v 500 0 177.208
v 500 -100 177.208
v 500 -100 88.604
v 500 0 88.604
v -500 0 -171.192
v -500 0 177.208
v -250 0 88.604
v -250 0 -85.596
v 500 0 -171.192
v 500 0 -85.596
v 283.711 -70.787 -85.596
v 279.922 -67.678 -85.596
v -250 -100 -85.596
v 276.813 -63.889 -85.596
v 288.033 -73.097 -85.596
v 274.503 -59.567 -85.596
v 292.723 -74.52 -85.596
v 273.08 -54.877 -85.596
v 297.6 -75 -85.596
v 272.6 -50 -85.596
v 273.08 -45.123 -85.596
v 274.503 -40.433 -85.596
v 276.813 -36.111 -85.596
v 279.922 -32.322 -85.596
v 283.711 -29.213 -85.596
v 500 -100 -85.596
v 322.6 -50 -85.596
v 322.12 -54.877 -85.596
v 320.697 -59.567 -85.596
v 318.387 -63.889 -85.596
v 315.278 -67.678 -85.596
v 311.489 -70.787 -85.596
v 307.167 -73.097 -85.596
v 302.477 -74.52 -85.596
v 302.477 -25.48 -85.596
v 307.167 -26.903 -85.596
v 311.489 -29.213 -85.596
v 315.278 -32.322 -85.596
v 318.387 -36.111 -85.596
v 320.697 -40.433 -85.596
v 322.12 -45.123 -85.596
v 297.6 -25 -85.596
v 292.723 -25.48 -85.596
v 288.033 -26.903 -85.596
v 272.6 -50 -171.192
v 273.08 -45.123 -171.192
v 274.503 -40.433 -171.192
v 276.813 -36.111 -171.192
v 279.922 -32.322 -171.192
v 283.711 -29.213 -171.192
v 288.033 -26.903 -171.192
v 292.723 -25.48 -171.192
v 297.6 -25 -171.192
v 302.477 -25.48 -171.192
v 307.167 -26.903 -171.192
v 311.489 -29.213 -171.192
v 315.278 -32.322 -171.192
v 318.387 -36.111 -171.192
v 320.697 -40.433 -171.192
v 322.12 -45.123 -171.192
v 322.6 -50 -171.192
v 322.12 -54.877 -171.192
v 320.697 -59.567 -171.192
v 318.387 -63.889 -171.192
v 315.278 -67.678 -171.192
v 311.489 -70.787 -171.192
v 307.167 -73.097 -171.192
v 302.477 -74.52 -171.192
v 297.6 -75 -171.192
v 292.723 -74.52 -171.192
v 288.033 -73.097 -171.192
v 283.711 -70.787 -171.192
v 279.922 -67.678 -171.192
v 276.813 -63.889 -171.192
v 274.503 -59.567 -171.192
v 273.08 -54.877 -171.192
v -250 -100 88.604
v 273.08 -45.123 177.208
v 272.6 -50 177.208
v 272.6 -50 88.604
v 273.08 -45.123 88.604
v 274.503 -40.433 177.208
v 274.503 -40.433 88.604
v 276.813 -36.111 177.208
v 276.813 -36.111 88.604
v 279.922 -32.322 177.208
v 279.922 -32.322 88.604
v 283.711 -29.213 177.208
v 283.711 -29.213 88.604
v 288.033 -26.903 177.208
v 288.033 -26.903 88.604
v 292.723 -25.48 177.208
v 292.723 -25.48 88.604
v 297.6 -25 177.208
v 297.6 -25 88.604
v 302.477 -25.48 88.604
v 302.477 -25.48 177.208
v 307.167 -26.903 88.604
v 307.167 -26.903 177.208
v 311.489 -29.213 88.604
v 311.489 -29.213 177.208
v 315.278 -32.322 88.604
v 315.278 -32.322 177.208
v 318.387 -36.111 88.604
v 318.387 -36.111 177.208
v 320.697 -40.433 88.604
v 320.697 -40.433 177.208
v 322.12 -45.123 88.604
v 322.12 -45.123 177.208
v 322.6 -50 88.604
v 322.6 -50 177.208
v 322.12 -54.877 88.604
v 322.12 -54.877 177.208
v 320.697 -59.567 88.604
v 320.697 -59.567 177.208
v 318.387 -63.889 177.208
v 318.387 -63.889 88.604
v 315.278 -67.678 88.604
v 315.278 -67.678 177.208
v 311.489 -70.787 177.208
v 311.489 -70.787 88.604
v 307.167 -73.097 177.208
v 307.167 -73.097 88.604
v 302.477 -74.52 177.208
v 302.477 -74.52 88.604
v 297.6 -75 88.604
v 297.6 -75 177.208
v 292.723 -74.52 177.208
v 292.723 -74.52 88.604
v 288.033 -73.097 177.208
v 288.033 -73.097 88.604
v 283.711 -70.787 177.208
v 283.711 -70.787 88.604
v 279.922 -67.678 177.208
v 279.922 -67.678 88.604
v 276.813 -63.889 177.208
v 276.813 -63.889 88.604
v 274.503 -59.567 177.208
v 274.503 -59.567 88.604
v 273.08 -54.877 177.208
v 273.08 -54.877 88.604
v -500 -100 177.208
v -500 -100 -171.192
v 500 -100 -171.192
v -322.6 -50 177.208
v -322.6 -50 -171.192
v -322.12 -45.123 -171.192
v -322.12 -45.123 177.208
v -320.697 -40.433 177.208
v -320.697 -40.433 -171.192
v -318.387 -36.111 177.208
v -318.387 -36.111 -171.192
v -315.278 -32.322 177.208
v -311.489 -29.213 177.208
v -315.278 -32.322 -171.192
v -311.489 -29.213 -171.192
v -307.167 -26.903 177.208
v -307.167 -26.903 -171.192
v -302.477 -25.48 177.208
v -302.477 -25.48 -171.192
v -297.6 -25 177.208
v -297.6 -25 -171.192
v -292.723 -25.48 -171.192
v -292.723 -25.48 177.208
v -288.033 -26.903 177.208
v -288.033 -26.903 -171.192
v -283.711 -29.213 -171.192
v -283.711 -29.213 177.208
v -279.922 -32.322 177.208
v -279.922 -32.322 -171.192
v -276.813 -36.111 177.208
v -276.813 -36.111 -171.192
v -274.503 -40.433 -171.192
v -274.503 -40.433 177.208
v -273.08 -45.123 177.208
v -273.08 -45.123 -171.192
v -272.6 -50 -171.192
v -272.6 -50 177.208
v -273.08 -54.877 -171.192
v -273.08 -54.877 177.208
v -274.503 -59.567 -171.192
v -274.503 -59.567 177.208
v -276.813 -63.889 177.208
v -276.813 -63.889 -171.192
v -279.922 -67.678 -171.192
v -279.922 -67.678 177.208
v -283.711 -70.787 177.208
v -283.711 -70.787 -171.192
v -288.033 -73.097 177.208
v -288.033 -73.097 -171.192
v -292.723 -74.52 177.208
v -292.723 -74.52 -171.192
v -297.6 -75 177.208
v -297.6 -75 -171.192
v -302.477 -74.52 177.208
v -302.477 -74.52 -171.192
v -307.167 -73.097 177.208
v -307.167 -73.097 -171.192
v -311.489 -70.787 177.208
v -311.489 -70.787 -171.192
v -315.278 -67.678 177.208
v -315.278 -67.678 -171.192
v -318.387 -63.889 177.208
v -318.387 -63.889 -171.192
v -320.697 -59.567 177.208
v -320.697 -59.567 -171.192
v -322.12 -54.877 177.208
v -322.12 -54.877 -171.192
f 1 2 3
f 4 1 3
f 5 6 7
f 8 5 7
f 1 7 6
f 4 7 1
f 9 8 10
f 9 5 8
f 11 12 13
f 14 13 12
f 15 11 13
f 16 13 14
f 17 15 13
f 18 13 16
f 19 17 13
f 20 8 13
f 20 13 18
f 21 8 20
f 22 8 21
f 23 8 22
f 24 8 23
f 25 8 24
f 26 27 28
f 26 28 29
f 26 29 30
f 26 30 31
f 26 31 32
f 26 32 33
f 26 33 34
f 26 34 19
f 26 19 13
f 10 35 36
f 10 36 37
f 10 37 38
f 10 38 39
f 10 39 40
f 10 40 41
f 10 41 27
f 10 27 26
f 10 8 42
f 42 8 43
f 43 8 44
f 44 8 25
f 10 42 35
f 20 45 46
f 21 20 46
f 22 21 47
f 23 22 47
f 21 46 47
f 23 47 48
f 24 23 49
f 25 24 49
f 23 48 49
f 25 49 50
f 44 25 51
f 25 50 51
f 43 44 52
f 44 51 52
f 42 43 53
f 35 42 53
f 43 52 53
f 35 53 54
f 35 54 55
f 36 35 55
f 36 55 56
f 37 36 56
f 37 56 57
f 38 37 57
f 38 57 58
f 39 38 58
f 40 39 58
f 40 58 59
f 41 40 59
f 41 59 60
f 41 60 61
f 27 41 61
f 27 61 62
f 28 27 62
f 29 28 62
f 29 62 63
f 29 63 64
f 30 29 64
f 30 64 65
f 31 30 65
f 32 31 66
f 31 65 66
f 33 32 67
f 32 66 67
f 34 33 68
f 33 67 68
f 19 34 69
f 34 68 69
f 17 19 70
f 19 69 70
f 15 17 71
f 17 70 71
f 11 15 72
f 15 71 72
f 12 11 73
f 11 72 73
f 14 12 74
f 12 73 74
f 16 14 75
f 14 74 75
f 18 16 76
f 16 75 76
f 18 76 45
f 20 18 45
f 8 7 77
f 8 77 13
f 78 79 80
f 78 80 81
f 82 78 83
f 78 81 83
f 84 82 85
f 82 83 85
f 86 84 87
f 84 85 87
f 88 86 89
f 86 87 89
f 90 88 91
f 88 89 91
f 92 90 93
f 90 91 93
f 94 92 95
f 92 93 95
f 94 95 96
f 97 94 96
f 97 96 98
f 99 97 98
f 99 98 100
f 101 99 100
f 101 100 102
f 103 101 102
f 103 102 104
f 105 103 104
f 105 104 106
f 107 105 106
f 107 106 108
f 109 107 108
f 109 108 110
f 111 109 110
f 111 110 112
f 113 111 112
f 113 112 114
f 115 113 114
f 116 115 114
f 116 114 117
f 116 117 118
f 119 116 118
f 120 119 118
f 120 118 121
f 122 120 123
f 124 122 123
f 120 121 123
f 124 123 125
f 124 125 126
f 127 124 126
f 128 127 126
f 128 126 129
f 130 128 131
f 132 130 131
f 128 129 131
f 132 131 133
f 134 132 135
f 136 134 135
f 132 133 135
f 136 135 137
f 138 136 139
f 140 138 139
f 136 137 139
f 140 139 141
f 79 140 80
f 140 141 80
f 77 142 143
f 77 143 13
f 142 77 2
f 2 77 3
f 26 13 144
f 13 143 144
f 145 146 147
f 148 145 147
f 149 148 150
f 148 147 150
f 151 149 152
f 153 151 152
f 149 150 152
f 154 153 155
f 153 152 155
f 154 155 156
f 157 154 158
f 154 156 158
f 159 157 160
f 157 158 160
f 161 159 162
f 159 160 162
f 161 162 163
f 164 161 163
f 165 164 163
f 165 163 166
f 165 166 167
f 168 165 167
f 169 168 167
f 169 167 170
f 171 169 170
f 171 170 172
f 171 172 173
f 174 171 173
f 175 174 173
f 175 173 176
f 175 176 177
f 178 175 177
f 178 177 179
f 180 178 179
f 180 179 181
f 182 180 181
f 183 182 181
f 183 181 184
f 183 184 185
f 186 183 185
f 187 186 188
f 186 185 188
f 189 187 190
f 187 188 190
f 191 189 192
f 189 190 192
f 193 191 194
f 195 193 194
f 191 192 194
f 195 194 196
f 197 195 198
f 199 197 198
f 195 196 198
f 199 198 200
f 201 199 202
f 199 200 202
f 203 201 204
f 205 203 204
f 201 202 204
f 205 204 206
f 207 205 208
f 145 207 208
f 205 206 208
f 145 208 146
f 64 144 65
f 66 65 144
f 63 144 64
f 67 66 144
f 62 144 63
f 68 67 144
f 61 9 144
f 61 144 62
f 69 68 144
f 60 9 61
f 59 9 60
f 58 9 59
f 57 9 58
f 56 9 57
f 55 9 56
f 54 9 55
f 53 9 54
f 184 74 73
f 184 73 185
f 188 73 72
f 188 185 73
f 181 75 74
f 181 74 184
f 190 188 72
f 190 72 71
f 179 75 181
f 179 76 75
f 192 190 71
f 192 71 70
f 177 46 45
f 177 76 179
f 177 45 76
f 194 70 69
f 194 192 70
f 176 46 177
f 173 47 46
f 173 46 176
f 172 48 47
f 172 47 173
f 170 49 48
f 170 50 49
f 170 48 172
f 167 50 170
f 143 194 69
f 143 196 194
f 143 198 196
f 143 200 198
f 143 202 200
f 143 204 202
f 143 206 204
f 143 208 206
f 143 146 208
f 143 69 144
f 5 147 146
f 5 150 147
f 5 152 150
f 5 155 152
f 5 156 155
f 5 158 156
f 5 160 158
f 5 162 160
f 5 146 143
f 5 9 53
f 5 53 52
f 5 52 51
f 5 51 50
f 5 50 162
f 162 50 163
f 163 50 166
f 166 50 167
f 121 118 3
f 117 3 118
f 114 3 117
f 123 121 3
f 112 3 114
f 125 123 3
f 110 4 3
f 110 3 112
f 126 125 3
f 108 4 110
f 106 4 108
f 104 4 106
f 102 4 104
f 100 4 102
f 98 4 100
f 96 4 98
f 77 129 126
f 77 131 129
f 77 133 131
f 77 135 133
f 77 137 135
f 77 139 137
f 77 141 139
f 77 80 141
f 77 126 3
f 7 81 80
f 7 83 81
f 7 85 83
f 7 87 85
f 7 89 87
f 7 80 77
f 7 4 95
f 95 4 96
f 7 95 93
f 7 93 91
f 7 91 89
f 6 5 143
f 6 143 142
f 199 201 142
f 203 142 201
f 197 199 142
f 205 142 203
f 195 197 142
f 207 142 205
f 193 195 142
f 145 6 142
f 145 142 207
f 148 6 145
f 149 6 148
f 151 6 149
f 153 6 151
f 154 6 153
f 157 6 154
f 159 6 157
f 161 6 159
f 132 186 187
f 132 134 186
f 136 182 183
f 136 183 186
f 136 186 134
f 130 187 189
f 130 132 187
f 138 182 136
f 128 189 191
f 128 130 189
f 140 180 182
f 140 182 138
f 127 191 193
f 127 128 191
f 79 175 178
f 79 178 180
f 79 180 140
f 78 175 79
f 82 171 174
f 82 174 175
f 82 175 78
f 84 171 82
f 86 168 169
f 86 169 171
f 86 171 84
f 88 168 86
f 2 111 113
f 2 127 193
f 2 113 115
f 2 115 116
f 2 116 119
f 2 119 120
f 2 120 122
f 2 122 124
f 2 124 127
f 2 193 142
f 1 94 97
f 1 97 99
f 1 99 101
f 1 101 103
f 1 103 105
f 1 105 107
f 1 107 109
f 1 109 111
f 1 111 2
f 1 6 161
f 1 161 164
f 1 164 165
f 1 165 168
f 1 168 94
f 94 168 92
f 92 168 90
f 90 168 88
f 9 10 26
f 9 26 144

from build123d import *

# Parameters (mm, degrees)
BOSS_EXTRUDE1_DEPTH = 100
CUT_EXTRUDE1_REACH  = 619.562
SKETCH8_R           = 25


with BuildPart() as part:
    # Sketch5 → Boss-Extrude1 (new body)
    with BuildSketch(Plane(origin=(0, 0, 0), x_dir=(-1, 0, 0), z_dir=(0, -1, 0))):
        Polygon((-500, 171.192494481), (500, 171.192494481), (500, -177.207505519), (-500, -177.207505519), (-500, -88.603752759), (250, -88.603752759), (250, 85.596247241), (-500, 85.596247241), align=None)
    extrude(amount=BOSS_EXTRUDE1_DEPTH)

    # Cut-Extrude1: up to this face of the body (flat: up to its plane)
    cut_extrude1_end = Plane(part.part.faces().sort_by_distance((0, -50, 177.207505519))[0])
    # Sketch8 → Cut-Extrude1 (cut, up to the picked face)
    with BuildSketch(Plane(origin=(0, 0, -171.192494481), x_dir=(-1, 0, 0), z_dir=(0, 0, -1)), mode=Mode.PRIVATE) as cut_extrude1_sk1:
        with Locations((-297.6, -50)):
            Circle(SKETCH8_R)
    cut_extrude1_tool1 = split(extrude(cut_extrude1_sk1.sketch, amount=-CUT_EXTRUDE1_REACH, mode=Mode.PRIVATE), bisect_by=cut_extrude1_end, keep=Keep.BOTH, mode=Mode.PRIVATE)
    # Sketch8 → Cut-Extrude1 (cut, up to the picked face)
    with BuildSketch(Plane(origin=(0, 0, -171.192494481), x_dir=(-1, 0, 0), z_dir=(0, 0, -1)), mode=Mode.PRIVATE) as cut_extrude1_sk2:
        with Locations((297.6, -50)):
            Circle(SKETCH8_R)
    cut_extrude1_tool2 = split(extrude(cut_extrude1_sk2.sketch, amount=-CUT_EXTRUDE1_REACH, mode=Mode.PRIVATE), bisect_by=cut_extrude1_end, keep=Keep.BOTH, mode=Mode.PRIVATE)
    add(cut_extrude1_tool1.solids().sort_by(Axis((297.6, -50, -171.192494), (0, 0, 1)))[0], mode=Mode.SUBTRACT)
    add(cut_extrude1_tool2.solids().sort_by(Axis((-297.6, -50, -171.192494), (0, 0, 1)))[0], mode=Mode.SUBTRACT)


solid = part.part
